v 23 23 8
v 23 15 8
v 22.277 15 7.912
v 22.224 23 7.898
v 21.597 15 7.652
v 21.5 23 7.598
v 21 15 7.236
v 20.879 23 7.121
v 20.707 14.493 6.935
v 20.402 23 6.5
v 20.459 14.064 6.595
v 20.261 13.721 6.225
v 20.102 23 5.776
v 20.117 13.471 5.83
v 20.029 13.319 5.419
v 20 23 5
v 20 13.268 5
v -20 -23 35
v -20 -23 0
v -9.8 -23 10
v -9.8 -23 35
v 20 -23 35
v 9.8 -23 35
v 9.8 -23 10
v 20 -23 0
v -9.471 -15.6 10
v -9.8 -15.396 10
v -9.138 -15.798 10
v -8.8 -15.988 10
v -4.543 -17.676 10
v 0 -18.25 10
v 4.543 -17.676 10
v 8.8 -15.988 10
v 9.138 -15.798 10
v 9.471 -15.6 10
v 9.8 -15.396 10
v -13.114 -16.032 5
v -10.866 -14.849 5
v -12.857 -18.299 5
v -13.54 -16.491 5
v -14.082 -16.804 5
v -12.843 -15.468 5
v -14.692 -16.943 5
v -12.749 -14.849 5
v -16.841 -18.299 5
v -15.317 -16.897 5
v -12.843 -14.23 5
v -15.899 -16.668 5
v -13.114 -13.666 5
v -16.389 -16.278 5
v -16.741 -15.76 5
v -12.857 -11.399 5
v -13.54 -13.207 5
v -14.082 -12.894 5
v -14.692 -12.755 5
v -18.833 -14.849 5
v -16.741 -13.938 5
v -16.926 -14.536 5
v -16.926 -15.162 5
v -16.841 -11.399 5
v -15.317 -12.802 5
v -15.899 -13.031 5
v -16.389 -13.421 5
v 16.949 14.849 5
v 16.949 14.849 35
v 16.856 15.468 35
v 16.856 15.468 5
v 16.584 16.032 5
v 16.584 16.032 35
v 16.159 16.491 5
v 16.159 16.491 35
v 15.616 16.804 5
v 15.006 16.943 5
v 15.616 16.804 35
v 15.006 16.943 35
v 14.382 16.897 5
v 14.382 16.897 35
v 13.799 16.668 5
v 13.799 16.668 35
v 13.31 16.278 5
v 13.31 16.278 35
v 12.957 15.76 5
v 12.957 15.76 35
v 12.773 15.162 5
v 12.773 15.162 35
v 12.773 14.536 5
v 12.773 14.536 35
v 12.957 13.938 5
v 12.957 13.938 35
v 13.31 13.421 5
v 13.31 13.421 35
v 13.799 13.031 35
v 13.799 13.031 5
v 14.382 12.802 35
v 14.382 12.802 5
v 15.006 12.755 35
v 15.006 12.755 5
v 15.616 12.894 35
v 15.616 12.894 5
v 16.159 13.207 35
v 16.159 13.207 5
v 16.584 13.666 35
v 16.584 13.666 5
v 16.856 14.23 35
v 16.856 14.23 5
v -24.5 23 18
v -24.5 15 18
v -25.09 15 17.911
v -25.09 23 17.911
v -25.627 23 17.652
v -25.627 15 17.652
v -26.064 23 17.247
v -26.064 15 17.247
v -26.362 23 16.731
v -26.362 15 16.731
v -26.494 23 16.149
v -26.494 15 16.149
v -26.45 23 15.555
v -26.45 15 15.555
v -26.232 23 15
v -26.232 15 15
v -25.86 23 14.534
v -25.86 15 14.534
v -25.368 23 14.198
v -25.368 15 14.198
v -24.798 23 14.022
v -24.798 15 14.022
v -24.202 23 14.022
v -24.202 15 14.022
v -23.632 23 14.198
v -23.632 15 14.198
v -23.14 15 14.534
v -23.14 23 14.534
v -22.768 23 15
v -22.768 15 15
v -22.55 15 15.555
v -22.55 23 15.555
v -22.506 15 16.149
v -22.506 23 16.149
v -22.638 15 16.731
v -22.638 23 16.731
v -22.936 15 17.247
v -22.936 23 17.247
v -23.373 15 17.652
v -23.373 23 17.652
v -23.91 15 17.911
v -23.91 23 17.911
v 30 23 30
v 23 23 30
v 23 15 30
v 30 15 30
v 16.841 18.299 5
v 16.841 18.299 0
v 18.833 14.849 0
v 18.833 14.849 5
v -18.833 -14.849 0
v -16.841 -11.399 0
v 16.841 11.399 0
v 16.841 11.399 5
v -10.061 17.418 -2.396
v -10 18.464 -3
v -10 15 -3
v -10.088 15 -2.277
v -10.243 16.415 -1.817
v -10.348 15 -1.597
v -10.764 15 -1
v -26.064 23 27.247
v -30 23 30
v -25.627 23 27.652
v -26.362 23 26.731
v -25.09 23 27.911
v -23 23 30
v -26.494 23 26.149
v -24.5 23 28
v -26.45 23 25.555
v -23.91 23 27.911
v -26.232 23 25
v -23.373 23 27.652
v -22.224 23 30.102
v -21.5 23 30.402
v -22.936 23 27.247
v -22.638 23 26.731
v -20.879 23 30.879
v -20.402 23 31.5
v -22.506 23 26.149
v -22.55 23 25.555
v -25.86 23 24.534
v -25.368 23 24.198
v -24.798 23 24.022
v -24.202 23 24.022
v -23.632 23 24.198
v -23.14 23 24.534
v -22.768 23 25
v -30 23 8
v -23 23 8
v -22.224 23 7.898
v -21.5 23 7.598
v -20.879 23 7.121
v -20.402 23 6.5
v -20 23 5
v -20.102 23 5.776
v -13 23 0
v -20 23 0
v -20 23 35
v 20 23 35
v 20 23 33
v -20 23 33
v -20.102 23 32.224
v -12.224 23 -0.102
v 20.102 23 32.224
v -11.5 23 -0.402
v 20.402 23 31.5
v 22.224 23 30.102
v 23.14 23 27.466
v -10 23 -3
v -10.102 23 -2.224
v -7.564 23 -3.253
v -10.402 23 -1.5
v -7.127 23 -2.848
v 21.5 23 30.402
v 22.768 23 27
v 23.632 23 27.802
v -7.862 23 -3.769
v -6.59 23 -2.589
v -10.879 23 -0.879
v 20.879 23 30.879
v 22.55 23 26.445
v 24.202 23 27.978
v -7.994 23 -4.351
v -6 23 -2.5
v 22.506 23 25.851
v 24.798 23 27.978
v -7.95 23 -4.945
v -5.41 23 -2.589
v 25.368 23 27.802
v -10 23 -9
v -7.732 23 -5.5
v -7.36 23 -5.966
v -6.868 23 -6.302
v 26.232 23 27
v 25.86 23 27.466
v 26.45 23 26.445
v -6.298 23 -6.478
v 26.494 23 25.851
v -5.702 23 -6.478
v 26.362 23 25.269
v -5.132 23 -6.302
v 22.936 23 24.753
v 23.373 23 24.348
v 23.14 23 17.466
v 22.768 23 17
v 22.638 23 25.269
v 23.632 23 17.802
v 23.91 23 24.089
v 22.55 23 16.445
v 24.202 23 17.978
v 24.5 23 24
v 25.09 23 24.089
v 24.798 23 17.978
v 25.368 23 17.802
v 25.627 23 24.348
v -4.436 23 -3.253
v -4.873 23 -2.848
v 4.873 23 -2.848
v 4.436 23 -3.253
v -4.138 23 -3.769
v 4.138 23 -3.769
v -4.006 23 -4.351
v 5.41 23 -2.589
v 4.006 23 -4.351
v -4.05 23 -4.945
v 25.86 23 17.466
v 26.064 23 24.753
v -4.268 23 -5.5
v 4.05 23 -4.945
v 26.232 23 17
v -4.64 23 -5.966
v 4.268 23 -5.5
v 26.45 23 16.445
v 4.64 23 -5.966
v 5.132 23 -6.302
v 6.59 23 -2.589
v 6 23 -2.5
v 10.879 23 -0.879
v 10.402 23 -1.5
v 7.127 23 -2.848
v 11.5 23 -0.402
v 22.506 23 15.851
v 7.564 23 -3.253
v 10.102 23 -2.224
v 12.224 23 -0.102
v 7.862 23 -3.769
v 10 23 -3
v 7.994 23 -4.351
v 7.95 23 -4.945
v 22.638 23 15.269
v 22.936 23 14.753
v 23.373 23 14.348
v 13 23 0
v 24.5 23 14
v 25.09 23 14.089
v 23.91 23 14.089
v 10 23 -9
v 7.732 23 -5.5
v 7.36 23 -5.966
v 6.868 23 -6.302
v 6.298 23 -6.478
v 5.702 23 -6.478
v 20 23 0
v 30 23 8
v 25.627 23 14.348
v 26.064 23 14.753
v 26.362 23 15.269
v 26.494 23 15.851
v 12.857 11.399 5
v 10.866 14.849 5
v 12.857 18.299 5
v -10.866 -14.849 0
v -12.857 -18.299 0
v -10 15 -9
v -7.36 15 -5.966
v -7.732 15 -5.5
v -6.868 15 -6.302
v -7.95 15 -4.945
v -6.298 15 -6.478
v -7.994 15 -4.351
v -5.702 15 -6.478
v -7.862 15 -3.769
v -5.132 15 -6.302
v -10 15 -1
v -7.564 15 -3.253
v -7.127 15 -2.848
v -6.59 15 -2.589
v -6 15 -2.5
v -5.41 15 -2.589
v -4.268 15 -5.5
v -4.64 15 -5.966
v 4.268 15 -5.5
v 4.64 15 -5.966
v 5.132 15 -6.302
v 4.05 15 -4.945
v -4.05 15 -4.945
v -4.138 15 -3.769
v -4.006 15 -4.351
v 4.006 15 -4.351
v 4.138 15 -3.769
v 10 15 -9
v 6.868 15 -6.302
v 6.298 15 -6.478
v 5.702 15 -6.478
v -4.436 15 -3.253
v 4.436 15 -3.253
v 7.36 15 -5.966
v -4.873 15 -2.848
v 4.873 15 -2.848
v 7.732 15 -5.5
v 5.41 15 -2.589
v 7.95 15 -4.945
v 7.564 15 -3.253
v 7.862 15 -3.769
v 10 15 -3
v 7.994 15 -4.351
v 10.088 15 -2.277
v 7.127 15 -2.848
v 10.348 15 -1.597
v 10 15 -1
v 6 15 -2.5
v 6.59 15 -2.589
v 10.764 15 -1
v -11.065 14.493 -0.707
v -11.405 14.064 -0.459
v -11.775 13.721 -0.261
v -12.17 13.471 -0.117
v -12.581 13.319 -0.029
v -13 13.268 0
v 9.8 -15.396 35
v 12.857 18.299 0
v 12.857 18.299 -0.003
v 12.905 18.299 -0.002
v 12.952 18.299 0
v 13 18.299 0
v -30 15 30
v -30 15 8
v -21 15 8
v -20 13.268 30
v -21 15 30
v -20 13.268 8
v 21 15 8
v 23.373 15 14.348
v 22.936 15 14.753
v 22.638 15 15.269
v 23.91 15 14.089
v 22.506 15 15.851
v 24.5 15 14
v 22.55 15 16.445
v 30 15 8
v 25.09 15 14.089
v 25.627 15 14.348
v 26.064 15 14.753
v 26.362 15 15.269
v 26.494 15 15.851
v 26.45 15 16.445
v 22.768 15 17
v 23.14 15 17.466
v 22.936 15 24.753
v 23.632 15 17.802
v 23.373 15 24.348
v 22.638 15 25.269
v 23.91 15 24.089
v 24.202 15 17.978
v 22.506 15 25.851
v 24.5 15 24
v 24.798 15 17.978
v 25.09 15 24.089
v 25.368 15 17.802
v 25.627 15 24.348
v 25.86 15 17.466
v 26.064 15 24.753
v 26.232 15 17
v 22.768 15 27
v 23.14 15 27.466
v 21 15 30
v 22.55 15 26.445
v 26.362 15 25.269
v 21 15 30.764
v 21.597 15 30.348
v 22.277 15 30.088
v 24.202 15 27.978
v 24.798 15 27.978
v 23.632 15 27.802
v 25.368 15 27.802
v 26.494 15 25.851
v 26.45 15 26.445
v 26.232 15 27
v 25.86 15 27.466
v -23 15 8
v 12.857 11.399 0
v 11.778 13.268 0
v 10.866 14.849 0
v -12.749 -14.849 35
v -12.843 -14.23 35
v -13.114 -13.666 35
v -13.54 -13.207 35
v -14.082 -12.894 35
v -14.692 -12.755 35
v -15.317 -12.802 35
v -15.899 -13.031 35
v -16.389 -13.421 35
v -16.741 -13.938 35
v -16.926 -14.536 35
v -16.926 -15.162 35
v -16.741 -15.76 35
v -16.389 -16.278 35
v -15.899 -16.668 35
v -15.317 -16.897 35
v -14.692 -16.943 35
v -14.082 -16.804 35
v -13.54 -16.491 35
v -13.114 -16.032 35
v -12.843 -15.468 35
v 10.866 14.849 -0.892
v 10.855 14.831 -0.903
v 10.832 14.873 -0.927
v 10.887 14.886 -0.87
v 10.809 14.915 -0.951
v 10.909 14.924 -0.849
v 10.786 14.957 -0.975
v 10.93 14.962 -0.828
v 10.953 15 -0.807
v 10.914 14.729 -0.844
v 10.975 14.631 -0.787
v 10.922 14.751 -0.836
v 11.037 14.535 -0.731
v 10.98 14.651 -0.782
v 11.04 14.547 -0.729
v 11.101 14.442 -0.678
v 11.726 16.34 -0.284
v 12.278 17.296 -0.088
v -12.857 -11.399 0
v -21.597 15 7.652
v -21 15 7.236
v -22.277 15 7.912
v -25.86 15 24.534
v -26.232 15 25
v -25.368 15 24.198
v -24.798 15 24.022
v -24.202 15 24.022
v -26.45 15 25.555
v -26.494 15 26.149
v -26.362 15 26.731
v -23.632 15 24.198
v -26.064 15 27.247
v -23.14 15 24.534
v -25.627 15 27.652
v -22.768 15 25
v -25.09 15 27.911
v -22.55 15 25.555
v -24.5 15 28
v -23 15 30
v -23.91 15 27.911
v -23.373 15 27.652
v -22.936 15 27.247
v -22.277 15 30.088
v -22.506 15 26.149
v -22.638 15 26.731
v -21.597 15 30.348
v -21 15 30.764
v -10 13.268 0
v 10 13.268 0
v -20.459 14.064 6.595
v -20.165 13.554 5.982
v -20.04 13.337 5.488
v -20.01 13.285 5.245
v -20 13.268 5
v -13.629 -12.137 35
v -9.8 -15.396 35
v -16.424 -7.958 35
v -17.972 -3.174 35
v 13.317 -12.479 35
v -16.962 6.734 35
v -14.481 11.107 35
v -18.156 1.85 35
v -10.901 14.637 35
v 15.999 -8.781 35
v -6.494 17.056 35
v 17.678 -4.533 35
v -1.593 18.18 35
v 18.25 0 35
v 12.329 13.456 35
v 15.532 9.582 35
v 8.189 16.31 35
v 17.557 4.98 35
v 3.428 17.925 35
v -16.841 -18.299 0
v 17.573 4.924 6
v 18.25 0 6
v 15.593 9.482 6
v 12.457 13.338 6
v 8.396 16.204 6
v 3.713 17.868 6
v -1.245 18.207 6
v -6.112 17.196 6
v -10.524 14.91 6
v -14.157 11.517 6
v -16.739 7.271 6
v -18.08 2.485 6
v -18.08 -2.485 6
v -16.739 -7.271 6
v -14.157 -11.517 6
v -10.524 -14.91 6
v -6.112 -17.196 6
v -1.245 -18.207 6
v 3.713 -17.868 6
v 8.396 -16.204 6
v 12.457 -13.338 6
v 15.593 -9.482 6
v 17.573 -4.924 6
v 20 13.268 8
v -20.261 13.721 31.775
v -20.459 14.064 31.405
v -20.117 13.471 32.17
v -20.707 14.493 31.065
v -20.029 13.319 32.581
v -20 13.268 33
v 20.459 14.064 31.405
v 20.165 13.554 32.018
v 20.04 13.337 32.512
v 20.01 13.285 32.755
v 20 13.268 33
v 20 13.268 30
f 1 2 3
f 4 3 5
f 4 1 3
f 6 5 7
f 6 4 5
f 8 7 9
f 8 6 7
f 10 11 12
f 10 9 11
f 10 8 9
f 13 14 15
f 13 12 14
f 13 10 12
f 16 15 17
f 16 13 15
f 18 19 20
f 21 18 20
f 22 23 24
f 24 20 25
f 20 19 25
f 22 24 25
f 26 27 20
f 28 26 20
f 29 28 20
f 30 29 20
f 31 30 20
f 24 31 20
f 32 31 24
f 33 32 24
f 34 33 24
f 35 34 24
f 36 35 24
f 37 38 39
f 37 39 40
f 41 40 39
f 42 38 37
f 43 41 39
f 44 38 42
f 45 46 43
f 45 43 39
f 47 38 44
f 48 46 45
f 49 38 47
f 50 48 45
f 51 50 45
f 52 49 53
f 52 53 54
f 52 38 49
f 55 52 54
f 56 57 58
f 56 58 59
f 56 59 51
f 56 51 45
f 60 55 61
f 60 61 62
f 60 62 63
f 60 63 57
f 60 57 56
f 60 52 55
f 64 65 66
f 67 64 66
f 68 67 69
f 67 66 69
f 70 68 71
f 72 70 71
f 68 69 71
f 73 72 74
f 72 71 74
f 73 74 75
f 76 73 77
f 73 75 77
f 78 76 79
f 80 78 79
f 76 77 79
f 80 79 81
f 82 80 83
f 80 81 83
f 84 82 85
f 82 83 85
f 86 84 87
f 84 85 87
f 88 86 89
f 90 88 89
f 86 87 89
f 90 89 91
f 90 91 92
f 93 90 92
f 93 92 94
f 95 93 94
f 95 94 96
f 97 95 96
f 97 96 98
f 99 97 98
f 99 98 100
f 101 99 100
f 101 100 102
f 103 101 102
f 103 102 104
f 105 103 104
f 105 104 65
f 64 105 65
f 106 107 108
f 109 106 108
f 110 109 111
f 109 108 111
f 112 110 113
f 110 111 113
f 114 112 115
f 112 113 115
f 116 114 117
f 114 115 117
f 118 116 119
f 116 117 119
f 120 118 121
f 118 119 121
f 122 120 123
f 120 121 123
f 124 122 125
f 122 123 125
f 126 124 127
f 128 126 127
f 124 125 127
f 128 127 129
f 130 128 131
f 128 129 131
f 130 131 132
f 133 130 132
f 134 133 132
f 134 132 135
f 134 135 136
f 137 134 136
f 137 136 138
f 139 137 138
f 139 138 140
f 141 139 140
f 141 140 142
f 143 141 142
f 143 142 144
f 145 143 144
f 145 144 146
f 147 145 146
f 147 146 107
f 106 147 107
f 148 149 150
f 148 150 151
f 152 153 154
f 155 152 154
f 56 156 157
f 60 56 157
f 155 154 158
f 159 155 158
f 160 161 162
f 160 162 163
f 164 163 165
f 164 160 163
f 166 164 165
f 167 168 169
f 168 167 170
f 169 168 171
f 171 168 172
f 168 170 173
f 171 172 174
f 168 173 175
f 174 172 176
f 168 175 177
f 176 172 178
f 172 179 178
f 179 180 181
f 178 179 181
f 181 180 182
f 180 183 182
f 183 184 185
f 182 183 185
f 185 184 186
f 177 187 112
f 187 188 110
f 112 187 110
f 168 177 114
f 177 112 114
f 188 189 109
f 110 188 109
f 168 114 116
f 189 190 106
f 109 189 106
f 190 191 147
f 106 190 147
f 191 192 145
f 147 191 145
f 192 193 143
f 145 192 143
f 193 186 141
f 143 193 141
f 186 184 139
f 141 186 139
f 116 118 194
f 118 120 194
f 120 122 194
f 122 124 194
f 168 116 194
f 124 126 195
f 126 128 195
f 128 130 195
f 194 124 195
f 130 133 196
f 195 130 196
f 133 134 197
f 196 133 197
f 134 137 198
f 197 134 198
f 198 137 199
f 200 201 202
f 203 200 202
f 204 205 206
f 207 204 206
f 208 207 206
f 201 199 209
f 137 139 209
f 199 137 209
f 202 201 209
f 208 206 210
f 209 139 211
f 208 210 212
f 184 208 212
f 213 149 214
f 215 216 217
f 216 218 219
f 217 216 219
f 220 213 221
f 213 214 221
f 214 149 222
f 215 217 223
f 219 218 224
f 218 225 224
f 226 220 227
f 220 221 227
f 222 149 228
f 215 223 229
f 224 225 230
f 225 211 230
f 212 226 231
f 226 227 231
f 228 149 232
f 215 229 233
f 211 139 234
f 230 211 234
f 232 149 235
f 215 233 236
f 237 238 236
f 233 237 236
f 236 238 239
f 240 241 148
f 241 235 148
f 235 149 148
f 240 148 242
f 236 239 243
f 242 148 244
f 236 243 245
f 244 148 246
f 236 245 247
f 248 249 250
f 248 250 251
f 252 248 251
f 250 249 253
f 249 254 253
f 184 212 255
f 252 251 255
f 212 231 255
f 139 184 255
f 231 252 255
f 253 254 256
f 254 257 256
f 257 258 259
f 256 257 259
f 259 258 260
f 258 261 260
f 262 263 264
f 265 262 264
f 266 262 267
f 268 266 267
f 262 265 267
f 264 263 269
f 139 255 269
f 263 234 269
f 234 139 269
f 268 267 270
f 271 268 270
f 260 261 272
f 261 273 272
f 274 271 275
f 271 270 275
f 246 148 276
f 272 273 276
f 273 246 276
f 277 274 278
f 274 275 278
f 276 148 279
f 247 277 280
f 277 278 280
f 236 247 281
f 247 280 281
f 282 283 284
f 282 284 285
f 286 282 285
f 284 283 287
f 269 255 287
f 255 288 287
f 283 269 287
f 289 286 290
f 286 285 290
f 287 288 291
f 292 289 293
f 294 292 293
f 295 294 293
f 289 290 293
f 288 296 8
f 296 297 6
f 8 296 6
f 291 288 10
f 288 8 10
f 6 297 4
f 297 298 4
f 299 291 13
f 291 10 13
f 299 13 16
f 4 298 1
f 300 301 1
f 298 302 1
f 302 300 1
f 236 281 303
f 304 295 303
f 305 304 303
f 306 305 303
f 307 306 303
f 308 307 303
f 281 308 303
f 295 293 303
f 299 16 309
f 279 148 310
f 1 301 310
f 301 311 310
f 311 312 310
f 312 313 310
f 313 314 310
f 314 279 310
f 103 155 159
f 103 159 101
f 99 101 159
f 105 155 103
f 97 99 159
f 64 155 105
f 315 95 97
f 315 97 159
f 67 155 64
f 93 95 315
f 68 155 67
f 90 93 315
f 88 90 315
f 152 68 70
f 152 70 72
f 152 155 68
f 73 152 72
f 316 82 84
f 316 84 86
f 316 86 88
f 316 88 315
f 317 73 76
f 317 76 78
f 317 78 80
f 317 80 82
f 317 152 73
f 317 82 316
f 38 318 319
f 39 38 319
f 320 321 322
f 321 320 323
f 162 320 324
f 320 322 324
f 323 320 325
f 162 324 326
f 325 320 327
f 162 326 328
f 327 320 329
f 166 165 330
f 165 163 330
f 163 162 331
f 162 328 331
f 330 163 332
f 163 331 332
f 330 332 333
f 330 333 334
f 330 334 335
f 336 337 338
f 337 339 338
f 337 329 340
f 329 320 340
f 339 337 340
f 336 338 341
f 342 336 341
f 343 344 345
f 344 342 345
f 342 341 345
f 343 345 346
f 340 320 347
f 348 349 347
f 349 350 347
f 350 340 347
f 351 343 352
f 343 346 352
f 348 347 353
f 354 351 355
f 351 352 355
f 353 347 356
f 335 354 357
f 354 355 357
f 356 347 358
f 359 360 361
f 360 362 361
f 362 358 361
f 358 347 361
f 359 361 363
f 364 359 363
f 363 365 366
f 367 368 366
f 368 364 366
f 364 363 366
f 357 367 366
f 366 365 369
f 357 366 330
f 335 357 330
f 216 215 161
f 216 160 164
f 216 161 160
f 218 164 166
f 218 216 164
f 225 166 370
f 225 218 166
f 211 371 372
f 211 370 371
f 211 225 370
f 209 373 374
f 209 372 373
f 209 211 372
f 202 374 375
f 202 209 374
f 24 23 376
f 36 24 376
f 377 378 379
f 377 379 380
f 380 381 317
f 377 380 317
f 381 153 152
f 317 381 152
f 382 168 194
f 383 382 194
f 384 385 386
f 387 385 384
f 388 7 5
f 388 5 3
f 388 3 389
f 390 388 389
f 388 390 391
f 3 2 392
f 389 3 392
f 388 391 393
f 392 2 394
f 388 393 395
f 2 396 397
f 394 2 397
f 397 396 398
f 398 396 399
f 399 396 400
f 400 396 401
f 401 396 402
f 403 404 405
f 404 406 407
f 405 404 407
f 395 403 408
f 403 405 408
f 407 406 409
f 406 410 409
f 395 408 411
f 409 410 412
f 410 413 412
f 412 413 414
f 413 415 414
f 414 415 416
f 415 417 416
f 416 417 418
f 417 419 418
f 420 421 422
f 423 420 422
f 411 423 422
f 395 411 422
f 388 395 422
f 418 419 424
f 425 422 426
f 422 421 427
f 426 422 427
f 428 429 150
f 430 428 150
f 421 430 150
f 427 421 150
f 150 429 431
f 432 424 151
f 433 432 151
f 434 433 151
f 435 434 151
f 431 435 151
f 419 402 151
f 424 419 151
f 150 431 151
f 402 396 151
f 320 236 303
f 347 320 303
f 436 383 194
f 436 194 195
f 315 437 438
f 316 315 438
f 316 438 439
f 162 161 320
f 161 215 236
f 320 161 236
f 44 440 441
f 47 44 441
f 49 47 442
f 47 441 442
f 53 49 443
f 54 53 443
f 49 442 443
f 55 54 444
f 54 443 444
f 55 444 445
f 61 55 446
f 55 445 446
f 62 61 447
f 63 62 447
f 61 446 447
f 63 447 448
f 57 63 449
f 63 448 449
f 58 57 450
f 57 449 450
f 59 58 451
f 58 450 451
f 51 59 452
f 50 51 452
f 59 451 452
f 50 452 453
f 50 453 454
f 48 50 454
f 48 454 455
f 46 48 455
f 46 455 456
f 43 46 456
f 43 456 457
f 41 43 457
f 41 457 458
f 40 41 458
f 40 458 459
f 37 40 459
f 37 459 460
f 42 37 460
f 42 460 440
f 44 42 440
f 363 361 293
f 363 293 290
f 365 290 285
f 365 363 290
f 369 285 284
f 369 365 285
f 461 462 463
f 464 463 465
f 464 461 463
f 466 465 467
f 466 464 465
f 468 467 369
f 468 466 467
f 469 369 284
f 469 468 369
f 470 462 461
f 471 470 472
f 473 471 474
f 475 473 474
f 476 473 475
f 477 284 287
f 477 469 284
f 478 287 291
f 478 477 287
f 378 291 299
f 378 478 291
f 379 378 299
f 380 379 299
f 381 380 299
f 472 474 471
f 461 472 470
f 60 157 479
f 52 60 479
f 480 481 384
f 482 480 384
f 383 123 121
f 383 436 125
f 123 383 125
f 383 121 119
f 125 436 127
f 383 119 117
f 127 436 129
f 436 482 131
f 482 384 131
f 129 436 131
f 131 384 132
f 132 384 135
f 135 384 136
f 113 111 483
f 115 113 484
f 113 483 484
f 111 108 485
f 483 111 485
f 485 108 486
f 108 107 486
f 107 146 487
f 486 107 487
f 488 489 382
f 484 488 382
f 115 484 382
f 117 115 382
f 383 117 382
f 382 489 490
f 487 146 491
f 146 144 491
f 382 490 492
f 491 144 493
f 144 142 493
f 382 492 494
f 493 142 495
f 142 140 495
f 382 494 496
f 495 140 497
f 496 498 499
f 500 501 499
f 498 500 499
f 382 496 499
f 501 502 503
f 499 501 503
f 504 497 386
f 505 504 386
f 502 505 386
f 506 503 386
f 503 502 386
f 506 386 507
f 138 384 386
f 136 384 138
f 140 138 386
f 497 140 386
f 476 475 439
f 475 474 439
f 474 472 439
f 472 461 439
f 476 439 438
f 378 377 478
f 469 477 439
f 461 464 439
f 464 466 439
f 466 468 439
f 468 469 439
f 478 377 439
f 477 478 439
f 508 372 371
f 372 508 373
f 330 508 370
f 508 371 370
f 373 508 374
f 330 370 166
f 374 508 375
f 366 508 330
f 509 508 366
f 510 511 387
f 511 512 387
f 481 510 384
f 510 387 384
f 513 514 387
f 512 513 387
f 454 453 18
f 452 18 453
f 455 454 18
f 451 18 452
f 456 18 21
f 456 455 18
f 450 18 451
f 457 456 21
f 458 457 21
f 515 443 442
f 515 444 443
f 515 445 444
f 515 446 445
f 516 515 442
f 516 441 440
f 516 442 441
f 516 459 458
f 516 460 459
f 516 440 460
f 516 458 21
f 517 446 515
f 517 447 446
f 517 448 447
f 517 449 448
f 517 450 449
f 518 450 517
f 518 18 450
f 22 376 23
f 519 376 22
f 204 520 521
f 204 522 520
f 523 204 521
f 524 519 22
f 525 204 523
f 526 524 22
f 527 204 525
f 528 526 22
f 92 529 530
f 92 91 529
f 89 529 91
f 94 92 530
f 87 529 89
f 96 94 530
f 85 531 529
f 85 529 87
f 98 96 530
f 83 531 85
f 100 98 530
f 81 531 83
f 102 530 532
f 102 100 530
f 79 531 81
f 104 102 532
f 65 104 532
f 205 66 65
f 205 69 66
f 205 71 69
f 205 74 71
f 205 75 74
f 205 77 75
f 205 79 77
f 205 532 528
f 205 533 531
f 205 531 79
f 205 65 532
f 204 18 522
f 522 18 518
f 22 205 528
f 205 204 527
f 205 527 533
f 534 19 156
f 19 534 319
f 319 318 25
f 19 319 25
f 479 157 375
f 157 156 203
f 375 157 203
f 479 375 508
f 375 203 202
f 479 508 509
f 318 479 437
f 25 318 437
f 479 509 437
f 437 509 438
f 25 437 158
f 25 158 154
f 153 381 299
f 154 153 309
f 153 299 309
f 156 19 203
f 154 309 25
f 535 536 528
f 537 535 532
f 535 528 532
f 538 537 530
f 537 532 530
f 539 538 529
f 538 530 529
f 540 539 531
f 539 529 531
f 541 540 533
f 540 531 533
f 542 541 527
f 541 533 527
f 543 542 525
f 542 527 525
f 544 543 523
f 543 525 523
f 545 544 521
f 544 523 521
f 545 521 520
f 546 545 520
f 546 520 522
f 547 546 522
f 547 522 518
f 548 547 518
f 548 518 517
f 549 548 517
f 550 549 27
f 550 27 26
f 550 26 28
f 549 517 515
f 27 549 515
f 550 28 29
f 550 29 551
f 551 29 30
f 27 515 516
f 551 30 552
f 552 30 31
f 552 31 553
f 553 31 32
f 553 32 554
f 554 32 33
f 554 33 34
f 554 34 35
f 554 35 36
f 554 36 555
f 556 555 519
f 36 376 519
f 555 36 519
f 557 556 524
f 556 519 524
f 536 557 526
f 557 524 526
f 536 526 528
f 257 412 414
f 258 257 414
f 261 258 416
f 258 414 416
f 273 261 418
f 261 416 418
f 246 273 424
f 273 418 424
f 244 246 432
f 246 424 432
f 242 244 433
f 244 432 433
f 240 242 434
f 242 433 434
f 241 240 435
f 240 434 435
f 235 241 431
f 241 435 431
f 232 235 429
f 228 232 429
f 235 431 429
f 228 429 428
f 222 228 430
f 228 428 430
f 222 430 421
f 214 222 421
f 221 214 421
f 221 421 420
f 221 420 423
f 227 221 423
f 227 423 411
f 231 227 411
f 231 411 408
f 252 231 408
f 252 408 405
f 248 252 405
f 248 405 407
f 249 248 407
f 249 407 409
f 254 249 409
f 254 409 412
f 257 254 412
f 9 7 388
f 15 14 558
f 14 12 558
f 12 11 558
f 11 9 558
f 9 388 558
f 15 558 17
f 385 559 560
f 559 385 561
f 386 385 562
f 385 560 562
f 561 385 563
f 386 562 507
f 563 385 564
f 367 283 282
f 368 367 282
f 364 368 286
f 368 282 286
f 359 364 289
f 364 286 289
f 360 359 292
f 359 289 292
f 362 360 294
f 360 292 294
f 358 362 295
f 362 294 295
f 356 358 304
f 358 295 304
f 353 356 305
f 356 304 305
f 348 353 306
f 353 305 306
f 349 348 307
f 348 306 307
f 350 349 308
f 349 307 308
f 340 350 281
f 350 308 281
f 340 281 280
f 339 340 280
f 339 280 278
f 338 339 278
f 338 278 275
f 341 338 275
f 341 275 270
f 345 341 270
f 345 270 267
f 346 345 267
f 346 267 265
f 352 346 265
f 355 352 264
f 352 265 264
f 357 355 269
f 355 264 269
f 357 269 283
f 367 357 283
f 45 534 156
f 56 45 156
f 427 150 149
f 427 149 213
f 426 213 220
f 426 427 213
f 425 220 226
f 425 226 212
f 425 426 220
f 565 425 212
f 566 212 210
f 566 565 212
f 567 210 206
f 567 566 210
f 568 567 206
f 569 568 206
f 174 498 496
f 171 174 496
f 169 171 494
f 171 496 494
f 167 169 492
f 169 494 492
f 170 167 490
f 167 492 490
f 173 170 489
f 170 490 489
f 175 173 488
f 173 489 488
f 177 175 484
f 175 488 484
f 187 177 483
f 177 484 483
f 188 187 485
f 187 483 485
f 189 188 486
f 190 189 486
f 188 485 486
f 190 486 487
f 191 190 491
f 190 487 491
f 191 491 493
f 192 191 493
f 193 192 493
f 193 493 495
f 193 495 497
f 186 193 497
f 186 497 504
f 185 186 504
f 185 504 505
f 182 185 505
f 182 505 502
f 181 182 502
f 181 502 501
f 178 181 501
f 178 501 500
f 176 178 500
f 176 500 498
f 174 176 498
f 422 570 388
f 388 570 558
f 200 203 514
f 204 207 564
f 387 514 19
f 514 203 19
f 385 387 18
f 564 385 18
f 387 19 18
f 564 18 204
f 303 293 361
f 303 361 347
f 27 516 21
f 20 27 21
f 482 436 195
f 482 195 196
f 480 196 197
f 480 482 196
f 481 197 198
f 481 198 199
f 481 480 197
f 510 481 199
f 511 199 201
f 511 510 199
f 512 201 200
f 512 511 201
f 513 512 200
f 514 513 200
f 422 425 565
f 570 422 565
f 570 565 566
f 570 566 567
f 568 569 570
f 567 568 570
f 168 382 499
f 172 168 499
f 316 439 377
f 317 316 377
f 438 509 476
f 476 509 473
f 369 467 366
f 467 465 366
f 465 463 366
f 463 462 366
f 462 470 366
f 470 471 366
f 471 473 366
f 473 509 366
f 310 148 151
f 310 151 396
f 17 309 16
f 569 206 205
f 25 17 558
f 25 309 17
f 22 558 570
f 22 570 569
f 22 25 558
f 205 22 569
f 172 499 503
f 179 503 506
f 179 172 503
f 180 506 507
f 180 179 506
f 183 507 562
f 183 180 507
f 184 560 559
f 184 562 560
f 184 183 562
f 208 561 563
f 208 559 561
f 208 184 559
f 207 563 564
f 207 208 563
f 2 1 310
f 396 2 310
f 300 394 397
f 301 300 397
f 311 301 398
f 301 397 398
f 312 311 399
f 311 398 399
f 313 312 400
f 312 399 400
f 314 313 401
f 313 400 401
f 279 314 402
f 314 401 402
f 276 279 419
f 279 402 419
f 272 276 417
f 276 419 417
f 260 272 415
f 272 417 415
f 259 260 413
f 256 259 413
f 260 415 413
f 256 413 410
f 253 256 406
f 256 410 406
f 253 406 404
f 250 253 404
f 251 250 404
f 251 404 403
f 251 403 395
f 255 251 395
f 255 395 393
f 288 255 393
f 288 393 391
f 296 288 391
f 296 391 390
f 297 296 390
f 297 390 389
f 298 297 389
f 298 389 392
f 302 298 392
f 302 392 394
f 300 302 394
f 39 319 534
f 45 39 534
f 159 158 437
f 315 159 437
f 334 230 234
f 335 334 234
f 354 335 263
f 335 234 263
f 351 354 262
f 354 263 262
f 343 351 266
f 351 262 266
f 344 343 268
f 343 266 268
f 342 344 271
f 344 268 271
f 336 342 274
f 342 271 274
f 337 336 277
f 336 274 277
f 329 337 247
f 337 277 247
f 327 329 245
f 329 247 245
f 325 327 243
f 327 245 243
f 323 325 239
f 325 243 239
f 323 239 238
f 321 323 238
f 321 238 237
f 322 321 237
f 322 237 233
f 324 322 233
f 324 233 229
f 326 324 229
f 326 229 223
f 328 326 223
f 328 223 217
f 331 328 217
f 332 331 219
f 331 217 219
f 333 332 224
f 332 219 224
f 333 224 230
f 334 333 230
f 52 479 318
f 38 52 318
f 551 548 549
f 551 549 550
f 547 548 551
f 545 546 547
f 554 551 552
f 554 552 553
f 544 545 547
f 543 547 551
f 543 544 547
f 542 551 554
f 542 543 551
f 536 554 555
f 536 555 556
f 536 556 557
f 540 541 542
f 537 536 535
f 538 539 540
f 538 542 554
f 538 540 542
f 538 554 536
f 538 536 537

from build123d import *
from OCP.BRepFilletAPI import BRepFilletAPI_MakeChamfer

# Parameters (mm, degrees)
SKETCH_1_W          = 46
SKETCH_1_H          = 46
EXTRUDE_1_DEPTH     = 35
SKETCH_3_R          = 18.25
CUT_EXTRUDE_1_DEPTH = 29
CUT_EXTRUDE_2_DEPTH = 25
SKETCH_5_R          = 2.1
CUT_EXTRUDE_3_DEPTH = 48.780749262
CUT_EXTRUDE_4_DEPTH = 5
SKETCH_7_W          = 3
SKETCH_7_H          = 35
SKETCH_7_H_2        = 35.025411777
CUT_EXTRUDE_5_DEPTH = 61
SKETCH_8_W          = 10
SKETCH_8_H          = 22
SKETCH_8_W_2        = 20
SKETCH_8_H_2        = 9
SKETCH_8_R          = 2
EXTRUDE_2_DEPTH     = 8
SKETCH_9_R          = 2
CUT_EXTRUDE_6_DEPTH = 60.741108125
CHAMFER_1_SIZE      = 1
CHAMFER_1_SIZE2     = 1.732050808
FILLET_2_R          = 3


with BuildPart() as part:
    # 草图1 → 凸台-拉伸1 (new body)
    with BuildSketch(Plane.XY):
        Rectangle(SKETCH_1_W, SKETCH_1_H)
    extrude(amount=EXTRUDE_1_DEPTH)

    # 草图3 → 切除-拉伸1 (cut)
    with BuildSketch(Plane.XY.offset(35)):
        Circle(SKETCH_3_R)
    extrude(amount=-CUT_EXTRUDE_1_DEPTH, mode=Mode.SUBTRACT)

    # 草图4 → 切除-拉伸2 (cut)
    with BuildSketch(Plane.XY.offset(35)):
        with BuildLine():
            ThreePointArc((8.8, -15.988198773), (0, -18.25), (-8.8, -15.988198773))
            Line((-8.8, -15.988198773), (-8.8, -23))
            Line((-8.8, -23), (8.8, -23))
            Line((8.8, -23), (8.8, -15.988198773))
        make_face()
        with BuildLine():
            Line((-8.8, -23), (-8.8, -15.988198773))
            ThreePointArc((-8.8, -15.988198773), (-9.304719908, -15.699830809), (-9.8, -15.395535067))
            Line((-9.8, -15.395535067), (-9.8, -23))
            Line((-9.8, -23), (-8.8, -23))
        make_face()
        Polygon((-8.8, -23.08), (-8.8, -23), (-9.8, -23), (-9.8, -24.08), (9.8, -24.08), (9.8, -23), (8.8, -23), (8.8, -23.08), align=None)
        with BuildLine():
            ThreePointArc((9.8, -15.395535067), (9.304719908, -15.699830809), (8.8, -15.988198773))
            Line((8.8, -15.988198773), (8.8, -23))
            Line((8.8, -23), (9.8, -23))
            Line((9.8, -23), (9.8, -15.395535067))
        make_face()
    extrude(amount=-CUT_EXTRUDE_2_DEPTH, mode=Mode.SUBTRACT)

    # 草图5 → 切除-拉伸3 (cut, through all)
    with BuildSketch(Plane.XY.offset(35)):
        with Locations((-14.849242405, -14.849242405)):
            Circle(SKETCH_5_R)
        with Locations((14.849242405, 14.849242405)):
            Circle(SKETCH_5_R)
    extrude(amount=-CUT_EXTRUDE_3_DEPTH, mode=Mode.SUBTRACT)

    # 草图6 → 切除-拉伸4 (cut)
    with BuildSketch(Plane(origin=(0, 0, 0), x_dir=(-1, 0, 0), z_dir=(0, 0, -1))):
        Polygon((-10.865525548, 14.849242405), (-12.857383976, 18.299242405), (-16.841100834, 18.299242405), (-18.832959262, 14.849242405), (-16.841100834, 11.399242405), (-12.857383976, 11.399242405), align=None)
        Polygon((18.832959262, -14.849242405), (16.841100834, -11.399242405), (12.857383976, -11.399242405), (10.865525548, -14.849242405), (12.857383976, -18.299242405), (16.841100834, -18.299242405), align=None)
    extrude(amount=-CUT_EXTRUDE_4_DEPTH, mode=Mode.SUBTRACT)

    # 草图7 → 切除-拉伸5 (cut)
    with BuildSketch(Plane.XZ.offset(23)):
        with Locations((21.5, 17.5)):
            Rectangle(SKETCH_7_W, SKETCH_7_H)
        with Locations((-21.5, 17.512705889)):
            Rectangle(SKETCH_7_W, SKETCH_7_H_2)
    extrude(amount=-CUT_EXTRUDE_5_DEPTH, mode=Mode.SUBTRACT)

    # 草图8 → 凸台-拉伸2 (add)
    # profile 1 of 3: a face of its own
    with BuildSketch(Plane(origin=(0, 23, 0), x_dir=(1, 0, 0), z_dir=(0, 1, 0))):
        with Locations((25, -19)):
            Rectangle(SKETCH_8_W, SKETCH_8_H)
    # profile 2 of 3: a face of its own
    with BuildSketch(Plane(origin=(0, 23, 0), x_dir=(1, 0, 0), z_dir=(0, 1, 0))):
        with Locations((-25, -19)):
            Rectangle(SKETCH_8_W, SKETCH_8_H)
    # profile 3 of 3: a face of its own
    with BuildSketch(Plane(origin=(0, 23, 0), x_dir=(1, 0, 0), z_dir=(0, 1, 0))):
        with Locations((0, 4.5)):
            Rectangle(SKETCH_8_W_2, SKETCH_8_H_2)
        with Locations(Location((6, 4.5, 0), (0, 0, 270))):
            Circle(SKETCH_8_R, mode=Mode.SUBTRACT)
        with Locations(Location((-6, 4.5, 0), (0, 0, 270))):
            Circle(SKETCH_8_R, mode=Mode.SUBTRACT)
    extrude(amount=-EXTRUDE_2_DEPTH)

    # 草图9 → 切除-拉伸6 (cut, through all)
    with BuildSketch(Plane.XZ.offset(-15)):
        with Locations(Location((24.5, 26, 0), (0, 0, 270))):
            Circle(SKETCH_9_R)
        with Locations(Location((24.5, 16, 0), (0, 0, 270))):
            Circle(SKETCH_9_R)
        with Locations(Location((-24.5, 16, 0), (0, 0, 90))):
            Circle(SKETCH_9_R)
        with Locations(Location((-24.5, 26, 0), (0, 0, 90))):
            Circle(SKETCH_9_R)
    extrude(amount=-CUT_EXTRUDE_6_DEPTH, mode=Mode.SUBTRACT)

    # 倒角1: one chamfer whose edges measure the first distance from different faces: ONE call of the kernel's chamfer builder (chamfer() names one face for all edges)
    chamfer_1_edges_1 = [part.edges().sort_by_distance(p)[0] for p in [
        (20, 15, 19),
    ]]
    chamfer_1_side_1 = [part.faces().sort_by_distance(p)[0] for p in [
        (25.064486824, 15, 18.742052704),
    ]]
    chamfer_1_edges_2 = [part.edges().sort_by_distance(p)[0] for p in [
        (-20, 15, 19),
    ]]
    chamfer_1_side_2 = [part.faces().sort_by_distance(p)[0] for p in [
        (-25.064486824, 15, 18.742052704),
    ]]
    chamfer_1_edges_3 = [part.edges().sort_by_distance(p)[0] for p in [
        (0, 15, 0),
    ]]
    chamfer_1_side_3 = [part.faces().sort_by_distance(p)[0] for p in [
        (0, 15, -4.5),
    ]]
    chamfer_1 = BRepFilletAPI_MakeChamfer(part.part.solid().wrapped)
    for e in chamfer_1_edges_1:
        chamfer_1.Add(CHAMFER_1_SIZE, CHAMFER_1_SIZE2, e.wrapped, chamfer_1_side_1[0].wrapped)  # the first distance lies on this face
    for e in chamfer_1_edges_2:
        chamfer_1.Add(CHAMFER_1_SIZE, CHAMFER_1_SIZE2, e.wrapped, chamfer_1_side_2[0].wrapped)  # the first distance lies on this face
    for e in chamfer_1_edges_3:
        chamfer_1.Add(CHAMFER_1_SIZE, CHAMFER_1_SIZE2, e.wrapped, chamfer_1_side_3[0].wrapped)  # the first distance lies on this face
    add(Compound.cast(chamfer_1.Shape()), mode=Mode.REPLACE)

    # 圆角2
    # the kernel refuses this fillet: 3 mm, written as the material it adds along each edge
    with BuildSketch(Plane(origin=(-20, 23, 30), x_dir=(0, 0, 1), z_dir=(0, -1, 0))) as fillet_2_piece_1_section:
        with BuildLine():
            CenterArc((FILLET_2_R, FILLET_2_R), FILLET_2_R, 180, 90)
            Line((0, FILLET_2_R), (0, 0))
            Line((0, 0), (FILLET_2_R, 0))
        make_face()
    fillet_2_piece_1 = extrude(amount=17.232050808, mode=Mode.PRIVATE)
    fillet_2_piece_1 = split(fillet_2_piece_1, bisect_by=Plane(origin=(-20.640051051, 15, 30.684211078), z_dir=(0, 1, 0)), keep=Keep.TOP, mode=Mode.PRIVATE)
    add(fillet_2_piece_1)
    with BuildSketch(Plane(origin=(-20, 23, 30), x_dir=(0, 0, 1), z_dir=(0, -1, 0))) as fillet_2_piece_2_section:
        with BuildLine():
            CenterArc((FILLET_2_R, FILLET_2_R), FILLET_2_R, 180, 90)
            Line((0, FILLET_2_R), (0, 0))
            Line((0, 0), (FILLET_2_R, 0))
        make_face()
    fillet_2_piece_2 = extrude(amount=17.232050808, mode=Mode.PRIVATE)
    fillet_2_piece_2 = split(fillet_2_piece_2, bisect_by=Plane(origin=(-20.542525514, 14.207630947, 30.942273677), z_dir=(0.8660254037844399, 0.49999999999999784, 0)), keep=Keep.TOP, mode=Mode.PRIVATE)
    add(fillet_2_piece_2)
    with BuildSketch(Plane(origin=(-20, 5.767949192, 8), x_dir=(0, 0, -1), z_dir=(0, 1, 0))) as fillet_2_piece_3_section:
        with BuildLine():
            CenterArc((FILLET_2_R, FILLET_2_R), FILLET_2_R, 180, 90)
            Line((0, FILLET_2_R), (0, 0))
            Line((0, 0), (FILLET_2_R, 0))
        make_face()
    fillet_2_piece_3 = extrude(amount=17.232050808, mode=Mode.PRIVATE)
    fillet_2_piece_3 = split(fillet_2_piece_3, bisect_by=Plane(origin=(-21.788039326, 15, 7.854673445), z_dir=(0, 1, 0)), keep=Keep.TOP, mode=Mode.PRIVATE)
    add(fillet_2_piece_3)
    with BuildSketch(Plane(origin=(-20, 5.767949192, 8), x_dir=(0, 0, -1), z_dir=(0, 1, 0))) as fillet_2_piece_4_section:
        with BuildLine():
            CenterArc((FILLET_2_R, FILLET_2_R), FILLET_2_R, 180, 90)
            Line((0, FILLET_2_R), (0, 0))
            Line((0, 0), (FILLET_2_R, 0))
        make_face()
    fillet_2_piece_4 = extrude(amount=17.232050808, mode=Mode.PRIVATE)
    fillet_2_piece_4 = split(fillet_2_piece_4, bisect_by=Plane(origin=(-20.542525514, 14.207630947, 7.057726323), z_dir=(0.8660254037844399, 0.49999999999999784, 0)), keep=Keep.TOP, mode=Mode.PRIVATE)
    add(fillet_2_piece_4)
    with BuildSketch(Plane(origin=(-10, 23, 0), x_dir=(-1, 0, 0), z_dir=(0, -1, 0))) as fillet_2_piece_5_section:
        with BuildLine():
            CenterArc((FILLET_2_R, FILLET_2_R), FILLET_2_R, 180, 90)
            Line((0, FILLET_2_R), (0, 0))
            Line((0, 0), (FILLET_2_R, 0))
        make_face()
    fillet_2_piece_5 = extrude(amount=17.232050808, mode=Mode.PRIVATE)
    fillet_2_piece_5 = split(fillet_2_piece_5, bisect_by=Plane(origin=(-10.684211078, 17.911025018, -2.680681078), z_dir=(0, 0.49999999999999784, 0.8660254037844399)), keep=Keep.TOP, mode=Mode.PRIVATE)
    add(fillet_2_piece_5)
    with BuildSketch(Plane(origin=(-10, 30.5, 0), x_dir=(-1, 0, 0), z_dir=(0, -1, 0))) as fillet_2_piece_6_section:
        with BuildLine():
            CenterArc((FILLET_2_R, FILLET_2_R), FILLET_2_R, 180, 90)
            Line((0, FILLET_2_R), (0, 0))
            Line((0, 0), (FILLET_2_R, 0))
        make_face()
    fillet_2_piece_6 = extrude(amount=24.732050808, mode=Mode.PRIVATE)
    fillet_2_piece_6 = split(fillet_2_piece_6, bisect_by=Plane(origin=(-10.145326555, 15, -1.788039326), z_dir=(0, 1, 0)), keep=Keep.TOP, mode=Mode.PRIVATE)
    fillet_2_piece_6 = split(fillet_2_piece_6, bisect_by=Plane(origin=(-10.145326555, 15.853077594, -1.492524579), z_dir=(0, -0.49999999999999784, -0.8660254037844399)), keep=Keep.TOP, mode=Mode.PRIVATE)
    add(fillet_2_piece_6)
    with BuildSketch(Plane(origin=(10, 5.767949192, 0), x_dir=(1, 0, 0), z_dir=(0, 1, 0))) as fillet_2_piece_7_section:
        with BuildLine():
            CenterArc((FILLET_2_R, FILLET_2_R), FILLET_2_R, 180, 90)
            Line((0, FILLET_2_R), (0, 0))
            Line((0, 0), (FILLET_2_R, 0))
        make_face()
    fillet_2_piece_7 = extrude(amount=24.732050808, mode=Mode.PRIVATE)
    fillet_2_piece_7 = split(fillet_2_piece_7, bisect_by=Plane(origin=(11.207909256, 14.256216426, -0.228184972), z_dir=(-0.8660254037844387, -0.5, 0)), keep=Keep.TOP, mode=Mode.PRIVATE)
    fillet_2_piece_7 = split(fillet_2_piece_7, bisect_by=Plane(origin=(10.865578652, 13.959723109, -0.399395857), z_dir=(0, 0.49999999999999784, 0.8660254037844399)), keep=Keep.TOP, mode=Mode.PRIVATE)
    add(fillet_2_piece_7)
    with BuildSketch(Plane(origin=(10, 5.767949192, 0), x_dir=(1, 0, 0), z_dir=(0, 1, 0))) as fillet_2_piece_8_section:
        with BuildLine():
            CenterArc((FILLET_2_R, FILLET_2_R), FILLET_2_R, 180, 90)
            Line((0, FILLET_2_R), (0, 0))
            Line((0, 0), (FILLET_2_R, 0))
        make_face()
    fillet_2_piece_8 = extrude(amount=17.232050808, mode=Mode.PRIVATE)
    fillet_2_piece_8 = split(fillet_2_piece_8, bisect_by=Plane(origin=(10.956075536, 15.006079586, -1.705008592), z_dir=(-0.8660254037844386, 0.5000000000000001, 0)), keep=Keep.TOP, mode=Mode.PRIVATE)
    fillet_2_piece_8 = split(fillet_2_piece_8, bisect_by=Plane(origin=(10.158078867, 15, -1.705008592), z_dir=(0, 1, 0)), keep=Keep.TOP, mode=Mode.PRIVATE)
    add(fillet_2_piece_8)
    with BuildSketch(Plane(origin=(10, 5.767949192, 0), x_dir=(1, 0, 0), z_dir=(0, 1, 0))) as fillet_2_piece_9_section:
        with BuildLine():
            CenterArc((FILLET_2_R, FILLET_2_R), FILLET_2_R, 180, 90)
            Line((0, FILLET_2_R), (0, 0))
            Line((0, 0), (FILLET_2_R, 0))
        make_face()
    fillet_2_piece_9 = extrude(amount=17.232050808, mode=Mode.PRIVATE)
    fillet_2_piece_9 = split(fillet_2_piece_9, bisect_by=Plane(origin=(10.908693088, 14.924010778, -0.446987958), z_dir=(-0.8660254037844386, 0.5000000000000001, 0)), keep=Keep.TOP, mode=Mode.PRIVATE)
    fillet_2_piece_9 = split(fillet_2_piece_9, bisect_by=Plane(origin=(10.864092139, 14.722859622, -0.839992928), z_dir=(0, 0.49999999999999784, 0.8660254037844399)), keep=Keep.TOP, mode=Mode.PRIVATE)
    add(fillet_2_piece_9)
    with BuildSketch(Plane(origin=(10, 5.767949192, 0), x_dir=(1, 0, 0), z_dir=(0, 1, 0))) as fillet_2_piece_10_section:
        with BuildLine():
            CenterArc((FILLET_2_R, FILLET_2_R), FILLET_2_R, 180, 90)
            Line((0, FILLET_2_R), (0, 0))
            Line((0, 0), (FILLET_2_R, 0))
        make_face()
    fillet_2_piece_10 = extrude(amount=17.232050808, mode=Mode.PRIVATE)
    fillet_2_piece_10 = split(fillet_2_piece_10, bisect_by=Plane(origin=(12.9144267, 18.299242405, -0.000678235), z_dir=(0, 1, 0)), keep=Keep.TOP, mode=Mode.PRIVATE)
    add(fillet_2_piece_10)
    with BuildSketch(Plane(origin=(20, 23, 8), x_dir=(0, 0, -1), z_dir=(0, -1, 0))) as fillet_2_piece_11_section:
        with BuildLine():
            CenterArc((FILLET_2_R, FILLET_2_R), FILLET_2_R, 180, 90)
            Line((0, FILLET_2_R), (0, 0))
            Line((0, 0), (FILLET_2_R, 0))
        make_face()
    fillet_2_piece_11 = extrude(amount=17.232050808, mode=Mode.PRIVATE)
    fillet_2_piece_11 = split(fillet_2_piece_11, bisect_by=Plane(origin=(20.640051051, 15, 7.315788922), z_dir=(0, 1, 0)), keep=Keep.TOP, mode=Mode.PRIVATE)
    add(fillet_2_piece_11)
    with BuildSketch(Plane(origin=(20, 23, 8), x_dir=(0, 0, -1), z_dir=(0, -1, 0))) as fillet_2_piece_12_section:
        with BuildLine():
            CenterArc((FILLET_2_R, FILLET_2_R), FILLET_2_R, 180, 90)
            Line((0, FILLET_2_R), (0, 0))
            Line((0, 0), (FILLET_2_R, 0))
        make_face()
    fillet_2_piece_12 = extrude(amount=17.232050808, mode=Mode.PRIVATE)
    fillet_2_piece_12 = split(fillet_2_piece_12, bisect_by=Plane(origin=(20.542525514, 14.207630947, 7.057726323), z_dir=(-0.8660254037844399, 0.49999999999999784, 0)), keep=Keep.TOP, mode=Mode.PRIVATE)
    add(fillet_2_piece_12)
    with BuildSketch(Plane(origin=(20, 5.767949192, 30), x_dir=(0, 0, 1), z_dir=(0, 1, 0))) as fillet_2_piece_13_section:
        with BuildLine():
            CenterArc((FILLET_2_R, FILLET_2_R), FILLET_2_R, 180, 90)
            Line((0, FILLET_2_R), (0, 0))
            Line((0, 0), (FILLET_2_R, 0))
        make_face()
    fillet_2_piece_13 = extrude(amount=17.232050808, mode=Mode.PRIVATE)
    fillet_2_piece_13 = split(fillet_2_piece_13, bisect_by=Plane(origin=(21.788039326, 15, 30.145326555), z_dir=(0, 1, 0)), keep=Keep.TOP, mode=Mode.PRIVATE)
    add(fillet_2_piece_13)
    with BuildSketch(Plane(origin=(20, 5.767949192, 30), x_dir=(0, 0, 1), z_dir=(0, 1, 0))) as fillet_2_piece_14_section:
        with BuildLine():
            CenterArc((FILLET_2_R, FILLET_2_R), FILLET_2_R, 180, 90)
            Line((0, FILLET_2_R), (0, 0))
            Line((0, 0), (FILLET_2_R, 0))
        make_face()
    fillet_2_piece_14 = extrude(amount=17.232050808, mode=Mode.PRIVATE)
    fillet_2_piece_14 = split(fillet_2_piece_14, bisect_by=Plane(origin=(20.542525514, 14.207630947, 30.942273677), z_dir=(-0.8660254037844399, 0.49999999999999784, 0)), keep=Keep.TOP, mode=Mode.PRIVATE)
    add(fillet_2_piece_14)


solid = part.part
